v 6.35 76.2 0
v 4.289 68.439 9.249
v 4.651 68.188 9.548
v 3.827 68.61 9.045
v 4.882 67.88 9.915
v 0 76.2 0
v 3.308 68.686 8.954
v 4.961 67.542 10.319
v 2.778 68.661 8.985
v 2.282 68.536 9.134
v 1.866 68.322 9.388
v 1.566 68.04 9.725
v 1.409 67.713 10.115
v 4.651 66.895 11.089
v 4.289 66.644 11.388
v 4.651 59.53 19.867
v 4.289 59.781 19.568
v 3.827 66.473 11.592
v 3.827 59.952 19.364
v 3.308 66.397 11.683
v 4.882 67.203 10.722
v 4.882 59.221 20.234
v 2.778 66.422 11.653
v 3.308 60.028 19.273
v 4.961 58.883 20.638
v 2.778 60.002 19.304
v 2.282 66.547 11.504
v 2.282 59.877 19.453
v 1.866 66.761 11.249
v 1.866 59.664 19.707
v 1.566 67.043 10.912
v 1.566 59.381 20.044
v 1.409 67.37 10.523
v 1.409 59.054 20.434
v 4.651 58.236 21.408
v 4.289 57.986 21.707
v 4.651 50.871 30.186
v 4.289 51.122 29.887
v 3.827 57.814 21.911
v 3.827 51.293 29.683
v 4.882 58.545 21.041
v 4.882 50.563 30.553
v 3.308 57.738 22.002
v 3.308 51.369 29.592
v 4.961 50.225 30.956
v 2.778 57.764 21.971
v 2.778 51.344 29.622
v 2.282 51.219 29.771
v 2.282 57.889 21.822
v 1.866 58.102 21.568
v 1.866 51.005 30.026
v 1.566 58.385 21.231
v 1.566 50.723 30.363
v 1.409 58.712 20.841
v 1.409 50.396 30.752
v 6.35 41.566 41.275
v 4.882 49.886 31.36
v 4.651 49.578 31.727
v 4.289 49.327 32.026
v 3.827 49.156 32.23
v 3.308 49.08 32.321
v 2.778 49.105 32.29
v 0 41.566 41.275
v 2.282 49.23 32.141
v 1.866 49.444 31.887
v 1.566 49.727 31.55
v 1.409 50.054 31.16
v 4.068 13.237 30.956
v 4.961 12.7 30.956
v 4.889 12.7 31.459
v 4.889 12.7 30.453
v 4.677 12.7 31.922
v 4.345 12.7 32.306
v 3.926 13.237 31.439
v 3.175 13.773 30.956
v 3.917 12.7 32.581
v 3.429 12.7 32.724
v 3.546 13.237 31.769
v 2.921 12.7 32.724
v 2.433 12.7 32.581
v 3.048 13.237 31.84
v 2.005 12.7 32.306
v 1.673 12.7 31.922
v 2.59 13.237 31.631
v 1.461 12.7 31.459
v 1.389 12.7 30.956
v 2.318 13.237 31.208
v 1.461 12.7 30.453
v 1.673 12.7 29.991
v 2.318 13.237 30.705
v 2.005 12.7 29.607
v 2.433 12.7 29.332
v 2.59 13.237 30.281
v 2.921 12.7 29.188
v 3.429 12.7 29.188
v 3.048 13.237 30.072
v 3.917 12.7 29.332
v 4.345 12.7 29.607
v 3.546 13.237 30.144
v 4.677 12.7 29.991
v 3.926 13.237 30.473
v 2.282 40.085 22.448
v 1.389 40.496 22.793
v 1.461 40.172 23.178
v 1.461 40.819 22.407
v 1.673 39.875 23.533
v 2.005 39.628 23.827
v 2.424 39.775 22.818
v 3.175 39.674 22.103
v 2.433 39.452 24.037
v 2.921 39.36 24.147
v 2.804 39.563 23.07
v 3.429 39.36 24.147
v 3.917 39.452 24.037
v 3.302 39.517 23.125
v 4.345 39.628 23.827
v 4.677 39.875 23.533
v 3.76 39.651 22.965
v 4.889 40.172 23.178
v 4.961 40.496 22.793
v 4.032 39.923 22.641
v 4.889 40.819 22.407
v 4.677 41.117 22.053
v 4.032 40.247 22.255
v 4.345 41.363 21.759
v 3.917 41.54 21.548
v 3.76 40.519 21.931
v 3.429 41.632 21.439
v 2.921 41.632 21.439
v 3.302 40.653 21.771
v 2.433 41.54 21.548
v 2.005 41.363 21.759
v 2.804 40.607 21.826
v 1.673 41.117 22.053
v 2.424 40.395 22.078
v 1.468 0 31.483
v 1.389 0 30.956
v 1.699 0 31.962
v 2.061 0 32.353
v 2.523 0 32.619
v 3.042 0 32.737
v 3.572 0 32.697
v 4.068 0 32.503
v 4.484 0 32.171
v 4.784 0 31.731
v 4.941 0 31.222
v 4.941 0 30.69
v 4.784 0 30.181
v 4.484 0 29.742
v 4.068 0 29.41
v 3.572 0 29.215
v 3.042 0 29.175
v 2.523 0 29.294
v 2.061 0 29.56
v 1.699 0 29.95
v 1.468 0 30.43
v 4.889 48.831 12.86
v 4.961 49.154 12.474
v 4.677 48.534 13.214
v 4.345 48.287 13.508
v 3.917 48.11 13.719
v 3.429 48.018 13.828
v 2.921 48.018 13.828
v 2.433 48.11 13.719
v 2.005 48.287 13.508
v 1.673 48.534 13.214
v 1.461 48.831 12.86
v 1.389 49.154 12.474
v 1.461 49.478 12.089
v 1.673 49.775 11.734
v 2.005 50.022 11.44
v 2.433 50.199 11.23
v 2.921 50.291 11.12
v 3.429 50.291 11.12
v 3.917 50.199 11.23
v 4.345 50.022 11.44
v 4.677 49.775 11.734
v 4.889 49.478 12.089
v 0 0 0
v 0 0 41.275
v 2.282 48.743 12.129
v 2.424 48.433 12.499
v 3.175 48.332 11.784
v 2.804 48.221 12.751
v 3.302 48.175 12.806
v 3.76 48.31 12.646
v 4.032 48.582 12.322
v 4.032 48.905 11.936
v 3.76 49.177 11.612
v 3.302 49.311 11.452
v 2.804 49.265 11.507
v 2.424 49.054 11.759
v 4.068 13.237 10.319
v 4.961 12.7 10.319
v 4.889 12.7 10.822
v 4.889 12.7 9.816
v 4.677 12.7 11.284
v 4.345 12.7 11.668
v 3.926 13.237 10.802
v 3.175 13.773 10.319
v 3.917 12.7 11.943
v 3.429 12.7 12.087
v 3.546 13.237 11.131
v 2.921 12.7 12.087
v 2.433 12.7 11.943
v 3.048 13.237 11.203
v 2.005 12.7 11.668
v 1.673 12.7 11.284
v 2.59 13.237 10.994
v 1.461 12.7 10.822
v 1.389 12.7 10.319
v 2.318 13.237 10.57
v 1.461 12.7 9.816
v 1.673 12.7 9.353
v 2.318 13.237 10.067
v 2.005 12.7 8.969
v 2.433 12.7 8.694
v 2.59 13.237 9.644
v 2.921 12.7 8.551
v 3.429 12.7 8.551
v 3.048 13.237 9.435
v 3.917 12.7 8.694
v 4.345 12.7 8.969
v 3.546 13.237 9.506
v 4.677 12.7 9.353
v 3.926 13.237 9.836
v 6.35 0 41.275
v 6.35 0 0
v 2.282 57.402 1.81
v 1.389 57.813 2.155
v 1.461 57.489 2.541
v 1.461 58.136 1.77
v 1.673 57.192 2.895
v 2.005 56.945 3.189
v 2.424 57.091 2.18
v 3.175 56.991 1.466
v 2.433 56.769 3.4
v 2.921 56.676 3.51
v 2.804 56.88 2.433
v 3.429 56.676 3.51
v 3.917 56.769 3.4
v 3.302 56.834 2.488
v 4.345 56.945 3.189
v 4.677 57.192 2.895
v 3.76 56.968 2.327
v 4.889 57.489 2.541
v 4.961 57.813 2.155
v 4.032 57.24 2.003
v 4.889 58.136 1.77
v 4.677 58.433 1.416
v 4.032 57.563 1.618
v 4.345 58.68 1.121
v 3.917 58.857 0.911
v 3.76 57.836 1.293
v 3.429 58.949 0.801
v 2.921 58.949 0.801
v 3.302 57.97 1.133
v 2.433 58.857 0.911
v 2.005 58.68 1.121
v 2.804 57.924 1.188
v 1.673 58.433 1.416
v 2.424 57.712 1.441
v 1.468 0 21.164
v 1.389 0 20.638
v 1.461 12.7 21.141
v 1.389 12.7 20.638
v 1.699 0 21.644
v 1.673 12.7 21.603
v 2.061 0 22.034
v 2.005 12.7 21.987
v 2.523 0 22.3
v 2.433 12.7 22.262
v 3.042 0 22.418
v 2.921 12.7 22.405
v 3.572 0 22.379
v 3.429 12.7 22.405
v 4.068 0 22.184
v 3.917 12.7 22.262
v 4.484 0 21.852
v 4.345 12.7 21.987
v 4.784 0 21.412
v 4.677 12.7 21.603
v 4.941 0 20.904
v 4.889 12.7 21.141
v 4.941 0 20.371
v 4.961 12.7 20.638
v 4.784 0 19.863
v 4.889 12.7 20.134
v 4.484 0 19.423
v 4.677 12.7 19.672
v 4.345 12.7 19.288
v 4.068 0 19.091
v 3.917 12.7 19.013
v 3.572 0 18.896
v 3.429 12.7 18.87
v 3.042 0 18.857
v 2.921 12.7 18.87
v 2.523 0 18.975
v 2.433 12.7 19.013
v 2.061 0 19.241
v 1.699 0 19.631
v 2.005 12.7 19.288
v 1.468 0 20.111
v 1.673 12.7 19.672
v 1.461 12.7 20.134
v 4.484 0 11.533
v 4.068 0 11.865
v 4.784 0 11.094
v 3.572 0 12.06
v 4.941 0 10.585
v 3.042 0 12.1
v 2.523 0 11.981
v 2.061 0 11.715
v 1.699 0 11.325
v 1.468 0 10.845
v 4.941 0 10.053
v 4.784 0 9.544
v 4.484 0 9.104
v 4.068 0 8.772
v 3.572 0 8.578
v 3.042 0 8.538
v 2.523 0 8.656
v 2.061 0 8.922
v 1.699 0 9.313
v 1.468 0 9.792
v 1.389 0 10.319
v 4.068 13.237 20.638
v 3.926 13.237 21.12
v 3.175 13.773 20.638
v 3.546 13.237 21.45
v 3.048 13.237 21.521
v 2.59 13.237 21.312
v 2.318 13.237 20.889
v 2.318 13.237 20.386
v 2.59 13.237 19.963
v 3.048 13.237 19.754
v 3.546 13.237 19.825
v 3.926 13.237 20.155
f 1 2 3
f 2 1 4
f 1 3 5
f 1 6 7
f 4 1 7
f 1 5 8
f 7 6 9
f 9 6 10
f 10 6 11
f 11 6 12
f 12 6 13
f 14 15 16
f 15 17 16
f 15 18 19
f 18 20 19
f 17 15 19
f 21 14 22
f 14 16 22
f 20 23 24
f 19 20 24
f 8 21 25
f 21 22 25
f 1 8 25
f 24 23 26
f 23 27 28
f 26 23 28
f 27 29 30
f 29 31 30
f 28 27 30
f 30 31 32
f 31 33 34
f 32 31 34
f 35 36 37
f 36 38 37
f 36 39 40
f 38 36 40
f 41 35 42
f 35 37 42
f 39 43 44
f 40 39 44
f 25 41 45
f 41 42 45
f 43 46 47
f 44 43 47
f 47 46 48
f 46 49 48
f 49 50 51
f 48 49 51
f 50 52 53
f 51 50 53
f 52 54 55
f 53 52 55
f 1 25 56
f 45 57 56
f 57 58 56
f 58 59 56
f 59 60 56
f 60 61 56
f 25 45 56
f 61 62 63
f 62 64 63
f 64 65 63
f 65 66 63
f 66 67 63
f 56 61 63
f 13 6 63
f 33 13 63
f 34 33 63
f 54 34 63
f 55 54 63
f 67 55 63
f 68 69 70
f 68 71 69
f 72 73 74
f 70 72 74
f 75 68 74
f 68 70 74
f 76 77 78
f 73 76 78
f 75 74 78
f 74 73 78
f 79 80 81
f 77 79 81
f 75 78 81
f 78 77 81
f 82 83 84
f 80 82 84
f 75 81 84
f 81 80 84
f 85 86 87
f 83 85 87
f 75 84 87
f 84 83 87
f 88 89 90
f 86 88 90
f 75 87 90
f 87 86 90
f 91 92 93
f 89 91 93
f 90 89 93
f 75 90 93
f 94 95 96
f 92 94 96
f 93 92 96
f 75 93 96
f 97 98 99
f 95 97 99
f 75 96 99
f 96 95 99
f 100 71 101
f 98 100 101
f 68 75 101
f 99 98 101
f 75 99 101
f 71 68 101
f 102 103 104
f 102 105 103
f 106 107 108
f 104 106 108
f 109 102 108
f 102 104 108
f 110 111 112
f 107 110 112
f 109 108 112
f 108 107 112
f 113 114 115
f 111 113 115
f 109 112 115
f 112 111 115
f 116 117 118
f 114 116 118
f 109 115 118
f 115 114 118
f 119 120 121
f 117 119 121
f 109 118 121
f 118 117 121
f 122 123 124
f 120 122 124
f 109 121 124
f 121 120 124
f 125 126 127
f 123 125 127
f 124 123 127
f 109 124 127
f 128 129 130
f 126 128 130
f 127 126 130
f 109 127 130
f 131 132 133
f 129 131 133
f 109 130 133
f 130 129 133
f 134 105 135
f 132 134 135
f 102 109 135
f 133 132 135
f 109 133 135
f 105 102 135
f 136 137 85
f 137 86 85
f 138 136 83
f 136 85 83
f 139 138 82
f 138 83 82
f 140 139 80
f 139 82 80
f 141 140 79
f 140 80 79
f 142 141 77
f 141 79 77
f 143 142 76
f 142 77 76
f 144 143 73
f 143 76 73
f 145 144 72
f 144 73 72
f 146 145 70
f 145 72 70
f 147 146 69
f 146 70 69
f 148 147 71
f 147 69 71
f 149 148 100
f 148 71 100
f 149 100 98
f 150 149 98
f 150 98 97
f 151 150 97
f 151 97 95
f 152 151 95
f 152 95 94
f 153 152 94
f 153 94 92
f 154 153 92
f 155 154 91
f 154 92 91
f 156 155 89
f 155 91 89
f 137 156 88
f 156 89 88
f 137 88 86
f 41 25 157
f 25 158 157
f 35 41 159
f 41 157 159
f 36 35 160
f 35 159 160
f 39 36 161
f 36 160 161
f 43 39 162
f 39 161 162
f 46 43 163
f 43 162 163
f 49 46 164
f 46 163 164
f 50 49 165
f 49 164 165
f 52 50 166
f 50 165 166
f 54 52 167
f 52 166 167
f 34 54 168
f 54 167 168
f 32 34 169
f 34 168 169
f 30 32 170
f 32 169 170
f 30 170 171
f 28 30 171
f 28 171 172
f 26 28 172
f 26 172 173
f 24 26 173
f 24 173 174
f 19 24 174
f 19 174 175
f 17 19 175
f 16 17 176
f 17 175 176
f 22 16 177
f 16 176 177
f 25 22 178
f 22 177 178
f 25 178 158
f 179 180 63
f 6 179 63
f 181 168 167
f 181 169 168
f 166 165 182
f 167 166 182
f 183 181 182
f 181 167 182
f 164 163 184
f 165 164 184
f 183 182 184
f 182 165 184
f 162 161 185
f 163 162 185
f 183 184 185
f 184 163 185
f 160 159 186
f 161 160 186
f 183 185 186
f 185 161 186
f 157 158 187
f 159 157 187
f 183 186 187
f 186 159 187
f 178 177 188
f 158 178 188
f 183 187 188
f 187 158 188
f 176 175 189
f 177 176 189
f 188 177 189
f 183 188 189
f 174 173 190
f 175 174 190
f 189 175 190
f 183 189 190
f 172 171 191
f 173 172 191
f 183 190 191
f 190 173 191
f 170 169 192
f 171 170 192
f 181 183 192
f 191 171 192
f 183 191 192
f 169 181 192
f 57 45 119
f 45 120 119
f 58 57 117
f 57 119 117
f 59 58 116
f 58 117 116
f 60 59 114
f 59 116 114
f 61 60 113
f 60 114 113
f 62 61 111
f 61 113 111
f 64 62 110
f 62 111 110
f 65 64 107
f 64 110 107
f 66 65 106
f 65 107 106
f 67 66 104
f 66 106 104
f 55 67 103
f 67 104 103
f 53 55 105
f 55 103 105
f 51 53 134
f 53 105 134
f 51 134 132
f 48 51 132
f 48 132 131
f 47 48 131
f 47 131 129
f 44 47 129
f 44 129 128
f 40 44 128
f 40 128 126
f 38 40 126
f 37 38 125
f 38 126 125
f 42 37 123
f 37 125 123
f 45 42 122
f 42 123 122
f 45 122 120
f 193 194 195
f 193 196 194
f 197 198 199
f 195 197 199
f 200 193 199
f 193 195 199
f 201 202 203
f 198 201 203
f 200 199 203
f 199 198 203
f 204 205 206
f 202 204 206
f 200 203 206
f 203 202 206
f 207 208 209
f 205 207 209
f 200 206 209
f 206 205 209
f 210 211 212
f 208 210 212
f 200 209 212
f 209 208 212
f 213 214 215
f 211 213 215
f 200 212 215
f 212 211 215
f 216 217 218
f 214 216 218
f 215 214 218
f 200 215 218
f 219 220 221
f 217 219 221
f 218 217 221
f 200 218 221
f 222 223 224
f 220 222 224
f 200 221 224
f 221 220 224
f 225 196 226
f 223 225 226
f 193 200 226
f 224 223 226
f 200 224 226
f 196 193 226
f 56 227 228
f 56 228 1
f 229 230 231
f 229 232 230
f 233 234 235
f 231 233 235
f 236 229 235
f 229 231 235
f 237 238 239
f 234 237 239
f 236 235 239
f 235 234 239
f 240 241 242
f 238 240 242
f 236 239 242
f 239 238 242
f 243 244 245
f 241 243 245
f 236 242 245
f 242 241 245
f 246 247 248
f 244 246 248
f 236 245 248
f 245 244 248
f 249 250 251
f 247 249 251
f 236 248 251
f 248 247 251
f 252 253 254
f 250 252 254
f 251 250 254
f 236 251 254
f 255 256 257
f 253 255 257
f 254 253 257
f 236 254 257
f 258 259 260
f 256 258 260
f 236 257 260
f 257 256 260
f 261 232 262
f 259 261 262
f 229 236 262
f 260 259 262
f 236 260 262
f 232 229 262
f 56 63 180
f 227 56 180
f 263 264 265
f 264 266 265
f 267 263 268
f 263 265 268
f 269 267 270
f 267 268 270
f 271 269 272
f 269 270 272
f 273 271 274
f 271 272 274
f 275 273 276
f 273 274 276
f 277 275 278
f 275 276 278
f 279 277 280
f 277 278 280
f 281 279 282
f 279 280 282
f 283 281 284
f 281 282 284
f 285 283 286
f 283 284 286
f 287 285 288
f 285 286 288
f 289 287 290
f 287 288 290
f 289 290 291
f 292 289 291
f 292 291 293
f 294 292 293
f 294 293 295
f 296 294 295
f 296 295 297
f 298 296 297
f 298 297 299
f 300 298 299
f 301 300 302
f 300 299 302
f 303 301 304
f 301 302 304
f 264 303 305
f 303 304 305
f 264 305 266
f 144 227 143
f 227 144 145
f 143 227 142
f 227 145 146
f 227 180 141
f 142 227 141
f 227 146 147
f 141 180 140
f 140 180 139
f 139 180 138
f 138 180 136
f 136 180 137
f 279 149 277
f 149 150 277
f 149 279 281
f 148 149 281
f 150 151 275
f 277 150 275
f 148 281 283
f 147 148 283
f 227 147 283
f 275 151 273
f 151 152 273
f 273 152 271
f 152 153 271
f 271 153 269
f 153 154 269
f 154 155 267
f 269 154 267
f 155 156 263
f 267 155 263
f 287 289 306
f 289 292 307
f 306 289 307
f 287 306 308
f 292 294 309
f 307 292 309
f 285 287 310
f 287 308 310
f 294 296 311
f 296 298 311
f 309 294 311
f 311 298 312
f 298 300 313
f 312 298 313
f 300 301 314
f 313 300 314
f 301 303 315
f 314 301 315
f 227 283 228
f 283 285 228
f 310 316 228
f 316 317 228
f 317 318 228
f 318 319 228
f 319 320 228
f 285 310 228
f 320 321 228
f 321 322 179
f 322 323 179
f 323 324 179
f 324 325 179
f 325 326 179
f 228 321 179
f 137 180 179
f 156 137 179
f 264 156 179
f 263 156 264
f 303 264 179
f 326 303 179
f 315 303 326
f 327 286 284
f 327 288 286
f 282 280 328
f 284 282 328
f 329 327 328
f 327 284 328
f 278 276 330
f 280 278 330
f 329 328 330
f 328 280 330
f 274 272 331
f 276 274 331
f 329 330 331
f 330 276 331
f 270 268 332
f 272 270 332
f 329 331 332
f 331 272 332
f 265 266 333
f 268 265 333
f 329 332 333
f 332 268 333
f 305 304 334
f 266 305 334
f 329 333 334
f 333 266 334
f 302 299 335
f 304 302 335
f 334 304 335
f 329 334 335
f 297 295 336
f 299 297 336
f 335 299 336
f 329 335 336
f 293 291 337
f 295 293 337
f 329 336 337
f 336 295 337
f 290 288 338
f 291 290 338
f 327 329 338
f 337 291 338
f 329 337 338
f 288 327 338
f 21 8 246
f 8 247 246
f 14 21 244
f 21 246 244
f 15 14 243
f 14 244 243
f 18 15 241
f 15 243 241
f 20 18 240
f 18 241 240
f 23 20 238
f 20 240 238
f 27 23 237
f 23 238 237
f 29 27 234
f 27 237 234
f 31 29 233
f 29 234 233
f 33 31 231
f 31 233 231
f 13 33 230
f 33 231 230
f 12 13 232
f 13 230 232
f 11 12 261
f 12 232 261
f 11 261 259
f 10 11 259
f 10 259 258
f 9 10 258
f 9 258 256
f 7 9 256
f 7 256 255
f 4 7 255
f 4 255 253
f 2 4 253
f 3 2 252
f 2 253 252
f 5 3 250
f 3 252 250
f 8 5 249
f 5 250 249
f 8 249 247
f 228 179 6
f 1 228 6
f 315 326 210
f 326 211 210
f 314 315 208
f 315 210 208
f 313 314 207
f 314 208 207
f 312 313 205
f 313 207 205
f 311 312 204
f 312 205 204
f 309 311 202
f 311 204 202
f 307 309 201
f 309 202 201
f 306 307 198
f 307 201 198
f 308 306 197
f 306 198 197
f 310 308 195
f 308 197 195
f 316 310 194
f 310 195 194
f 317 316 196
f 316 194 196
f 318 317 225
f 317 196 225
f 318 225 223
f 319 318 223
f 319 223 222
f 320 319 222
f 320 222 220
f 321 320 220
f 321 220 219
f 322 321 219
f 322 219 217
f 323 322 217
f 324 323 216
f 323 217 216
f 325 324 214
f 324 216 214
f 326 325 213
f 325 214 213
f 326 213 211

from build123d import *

# Parameters (mm, degrees)
F1_DEPTH = 6.35
F4_D     = 3.571875
F4_DEPTH = 12.7
F4_TIP   = 1.0730995118
F5_D     = 3.571875
F5_DEPTH = 12.7
F5_TIP   = 1.0730995118


with BuildPart() as f1:
    # F0 (on Right) → F1 (new body)
    with BuildSketch(Plane.YZ):
        Polygon((0, 41.275), (0, 0), (76.2, 0), (41.5661627232, 41.275), align=None)
    extrude(amount=F1_DEPTH)

    # F4
    with Locations(Plane.XZ):
        with Locations((3.175, 30.95625), (3.175, 10.31875), (3.175, 20.6375)):
            Hole(F4_D / 2, depth=F4_DEPTH)
            with Locations((0, 0, -(F4_DEPTH + F4_TIP / 2))):  # 118° drill point
                Cone(0, F4_D / 2, F4_TIP, mode=Mode.SUBTRACT)

    # F5
    with Locations(Plane(origin=(0, 44.7159955691, 37.5211753898), x_dir=(-1, 0, 0), z_dir=(0, 0.7660444431, 0.6427876097))):
        with Locations((-3.175, -8.5699014577), (-3.175, -22.0400729245), (-3.175, -35.5102443913)):
            Hole(F5_D / 2, depth=F5_DEPTH)
            with Locations((0, 0, -(F5_DEPTH + F5_TIP / 2))):  # 118° drill point
                Cone(0, F5_D / 2, F5_TIP, mode=Mode.SUBTRACT)


solid = f1.part
